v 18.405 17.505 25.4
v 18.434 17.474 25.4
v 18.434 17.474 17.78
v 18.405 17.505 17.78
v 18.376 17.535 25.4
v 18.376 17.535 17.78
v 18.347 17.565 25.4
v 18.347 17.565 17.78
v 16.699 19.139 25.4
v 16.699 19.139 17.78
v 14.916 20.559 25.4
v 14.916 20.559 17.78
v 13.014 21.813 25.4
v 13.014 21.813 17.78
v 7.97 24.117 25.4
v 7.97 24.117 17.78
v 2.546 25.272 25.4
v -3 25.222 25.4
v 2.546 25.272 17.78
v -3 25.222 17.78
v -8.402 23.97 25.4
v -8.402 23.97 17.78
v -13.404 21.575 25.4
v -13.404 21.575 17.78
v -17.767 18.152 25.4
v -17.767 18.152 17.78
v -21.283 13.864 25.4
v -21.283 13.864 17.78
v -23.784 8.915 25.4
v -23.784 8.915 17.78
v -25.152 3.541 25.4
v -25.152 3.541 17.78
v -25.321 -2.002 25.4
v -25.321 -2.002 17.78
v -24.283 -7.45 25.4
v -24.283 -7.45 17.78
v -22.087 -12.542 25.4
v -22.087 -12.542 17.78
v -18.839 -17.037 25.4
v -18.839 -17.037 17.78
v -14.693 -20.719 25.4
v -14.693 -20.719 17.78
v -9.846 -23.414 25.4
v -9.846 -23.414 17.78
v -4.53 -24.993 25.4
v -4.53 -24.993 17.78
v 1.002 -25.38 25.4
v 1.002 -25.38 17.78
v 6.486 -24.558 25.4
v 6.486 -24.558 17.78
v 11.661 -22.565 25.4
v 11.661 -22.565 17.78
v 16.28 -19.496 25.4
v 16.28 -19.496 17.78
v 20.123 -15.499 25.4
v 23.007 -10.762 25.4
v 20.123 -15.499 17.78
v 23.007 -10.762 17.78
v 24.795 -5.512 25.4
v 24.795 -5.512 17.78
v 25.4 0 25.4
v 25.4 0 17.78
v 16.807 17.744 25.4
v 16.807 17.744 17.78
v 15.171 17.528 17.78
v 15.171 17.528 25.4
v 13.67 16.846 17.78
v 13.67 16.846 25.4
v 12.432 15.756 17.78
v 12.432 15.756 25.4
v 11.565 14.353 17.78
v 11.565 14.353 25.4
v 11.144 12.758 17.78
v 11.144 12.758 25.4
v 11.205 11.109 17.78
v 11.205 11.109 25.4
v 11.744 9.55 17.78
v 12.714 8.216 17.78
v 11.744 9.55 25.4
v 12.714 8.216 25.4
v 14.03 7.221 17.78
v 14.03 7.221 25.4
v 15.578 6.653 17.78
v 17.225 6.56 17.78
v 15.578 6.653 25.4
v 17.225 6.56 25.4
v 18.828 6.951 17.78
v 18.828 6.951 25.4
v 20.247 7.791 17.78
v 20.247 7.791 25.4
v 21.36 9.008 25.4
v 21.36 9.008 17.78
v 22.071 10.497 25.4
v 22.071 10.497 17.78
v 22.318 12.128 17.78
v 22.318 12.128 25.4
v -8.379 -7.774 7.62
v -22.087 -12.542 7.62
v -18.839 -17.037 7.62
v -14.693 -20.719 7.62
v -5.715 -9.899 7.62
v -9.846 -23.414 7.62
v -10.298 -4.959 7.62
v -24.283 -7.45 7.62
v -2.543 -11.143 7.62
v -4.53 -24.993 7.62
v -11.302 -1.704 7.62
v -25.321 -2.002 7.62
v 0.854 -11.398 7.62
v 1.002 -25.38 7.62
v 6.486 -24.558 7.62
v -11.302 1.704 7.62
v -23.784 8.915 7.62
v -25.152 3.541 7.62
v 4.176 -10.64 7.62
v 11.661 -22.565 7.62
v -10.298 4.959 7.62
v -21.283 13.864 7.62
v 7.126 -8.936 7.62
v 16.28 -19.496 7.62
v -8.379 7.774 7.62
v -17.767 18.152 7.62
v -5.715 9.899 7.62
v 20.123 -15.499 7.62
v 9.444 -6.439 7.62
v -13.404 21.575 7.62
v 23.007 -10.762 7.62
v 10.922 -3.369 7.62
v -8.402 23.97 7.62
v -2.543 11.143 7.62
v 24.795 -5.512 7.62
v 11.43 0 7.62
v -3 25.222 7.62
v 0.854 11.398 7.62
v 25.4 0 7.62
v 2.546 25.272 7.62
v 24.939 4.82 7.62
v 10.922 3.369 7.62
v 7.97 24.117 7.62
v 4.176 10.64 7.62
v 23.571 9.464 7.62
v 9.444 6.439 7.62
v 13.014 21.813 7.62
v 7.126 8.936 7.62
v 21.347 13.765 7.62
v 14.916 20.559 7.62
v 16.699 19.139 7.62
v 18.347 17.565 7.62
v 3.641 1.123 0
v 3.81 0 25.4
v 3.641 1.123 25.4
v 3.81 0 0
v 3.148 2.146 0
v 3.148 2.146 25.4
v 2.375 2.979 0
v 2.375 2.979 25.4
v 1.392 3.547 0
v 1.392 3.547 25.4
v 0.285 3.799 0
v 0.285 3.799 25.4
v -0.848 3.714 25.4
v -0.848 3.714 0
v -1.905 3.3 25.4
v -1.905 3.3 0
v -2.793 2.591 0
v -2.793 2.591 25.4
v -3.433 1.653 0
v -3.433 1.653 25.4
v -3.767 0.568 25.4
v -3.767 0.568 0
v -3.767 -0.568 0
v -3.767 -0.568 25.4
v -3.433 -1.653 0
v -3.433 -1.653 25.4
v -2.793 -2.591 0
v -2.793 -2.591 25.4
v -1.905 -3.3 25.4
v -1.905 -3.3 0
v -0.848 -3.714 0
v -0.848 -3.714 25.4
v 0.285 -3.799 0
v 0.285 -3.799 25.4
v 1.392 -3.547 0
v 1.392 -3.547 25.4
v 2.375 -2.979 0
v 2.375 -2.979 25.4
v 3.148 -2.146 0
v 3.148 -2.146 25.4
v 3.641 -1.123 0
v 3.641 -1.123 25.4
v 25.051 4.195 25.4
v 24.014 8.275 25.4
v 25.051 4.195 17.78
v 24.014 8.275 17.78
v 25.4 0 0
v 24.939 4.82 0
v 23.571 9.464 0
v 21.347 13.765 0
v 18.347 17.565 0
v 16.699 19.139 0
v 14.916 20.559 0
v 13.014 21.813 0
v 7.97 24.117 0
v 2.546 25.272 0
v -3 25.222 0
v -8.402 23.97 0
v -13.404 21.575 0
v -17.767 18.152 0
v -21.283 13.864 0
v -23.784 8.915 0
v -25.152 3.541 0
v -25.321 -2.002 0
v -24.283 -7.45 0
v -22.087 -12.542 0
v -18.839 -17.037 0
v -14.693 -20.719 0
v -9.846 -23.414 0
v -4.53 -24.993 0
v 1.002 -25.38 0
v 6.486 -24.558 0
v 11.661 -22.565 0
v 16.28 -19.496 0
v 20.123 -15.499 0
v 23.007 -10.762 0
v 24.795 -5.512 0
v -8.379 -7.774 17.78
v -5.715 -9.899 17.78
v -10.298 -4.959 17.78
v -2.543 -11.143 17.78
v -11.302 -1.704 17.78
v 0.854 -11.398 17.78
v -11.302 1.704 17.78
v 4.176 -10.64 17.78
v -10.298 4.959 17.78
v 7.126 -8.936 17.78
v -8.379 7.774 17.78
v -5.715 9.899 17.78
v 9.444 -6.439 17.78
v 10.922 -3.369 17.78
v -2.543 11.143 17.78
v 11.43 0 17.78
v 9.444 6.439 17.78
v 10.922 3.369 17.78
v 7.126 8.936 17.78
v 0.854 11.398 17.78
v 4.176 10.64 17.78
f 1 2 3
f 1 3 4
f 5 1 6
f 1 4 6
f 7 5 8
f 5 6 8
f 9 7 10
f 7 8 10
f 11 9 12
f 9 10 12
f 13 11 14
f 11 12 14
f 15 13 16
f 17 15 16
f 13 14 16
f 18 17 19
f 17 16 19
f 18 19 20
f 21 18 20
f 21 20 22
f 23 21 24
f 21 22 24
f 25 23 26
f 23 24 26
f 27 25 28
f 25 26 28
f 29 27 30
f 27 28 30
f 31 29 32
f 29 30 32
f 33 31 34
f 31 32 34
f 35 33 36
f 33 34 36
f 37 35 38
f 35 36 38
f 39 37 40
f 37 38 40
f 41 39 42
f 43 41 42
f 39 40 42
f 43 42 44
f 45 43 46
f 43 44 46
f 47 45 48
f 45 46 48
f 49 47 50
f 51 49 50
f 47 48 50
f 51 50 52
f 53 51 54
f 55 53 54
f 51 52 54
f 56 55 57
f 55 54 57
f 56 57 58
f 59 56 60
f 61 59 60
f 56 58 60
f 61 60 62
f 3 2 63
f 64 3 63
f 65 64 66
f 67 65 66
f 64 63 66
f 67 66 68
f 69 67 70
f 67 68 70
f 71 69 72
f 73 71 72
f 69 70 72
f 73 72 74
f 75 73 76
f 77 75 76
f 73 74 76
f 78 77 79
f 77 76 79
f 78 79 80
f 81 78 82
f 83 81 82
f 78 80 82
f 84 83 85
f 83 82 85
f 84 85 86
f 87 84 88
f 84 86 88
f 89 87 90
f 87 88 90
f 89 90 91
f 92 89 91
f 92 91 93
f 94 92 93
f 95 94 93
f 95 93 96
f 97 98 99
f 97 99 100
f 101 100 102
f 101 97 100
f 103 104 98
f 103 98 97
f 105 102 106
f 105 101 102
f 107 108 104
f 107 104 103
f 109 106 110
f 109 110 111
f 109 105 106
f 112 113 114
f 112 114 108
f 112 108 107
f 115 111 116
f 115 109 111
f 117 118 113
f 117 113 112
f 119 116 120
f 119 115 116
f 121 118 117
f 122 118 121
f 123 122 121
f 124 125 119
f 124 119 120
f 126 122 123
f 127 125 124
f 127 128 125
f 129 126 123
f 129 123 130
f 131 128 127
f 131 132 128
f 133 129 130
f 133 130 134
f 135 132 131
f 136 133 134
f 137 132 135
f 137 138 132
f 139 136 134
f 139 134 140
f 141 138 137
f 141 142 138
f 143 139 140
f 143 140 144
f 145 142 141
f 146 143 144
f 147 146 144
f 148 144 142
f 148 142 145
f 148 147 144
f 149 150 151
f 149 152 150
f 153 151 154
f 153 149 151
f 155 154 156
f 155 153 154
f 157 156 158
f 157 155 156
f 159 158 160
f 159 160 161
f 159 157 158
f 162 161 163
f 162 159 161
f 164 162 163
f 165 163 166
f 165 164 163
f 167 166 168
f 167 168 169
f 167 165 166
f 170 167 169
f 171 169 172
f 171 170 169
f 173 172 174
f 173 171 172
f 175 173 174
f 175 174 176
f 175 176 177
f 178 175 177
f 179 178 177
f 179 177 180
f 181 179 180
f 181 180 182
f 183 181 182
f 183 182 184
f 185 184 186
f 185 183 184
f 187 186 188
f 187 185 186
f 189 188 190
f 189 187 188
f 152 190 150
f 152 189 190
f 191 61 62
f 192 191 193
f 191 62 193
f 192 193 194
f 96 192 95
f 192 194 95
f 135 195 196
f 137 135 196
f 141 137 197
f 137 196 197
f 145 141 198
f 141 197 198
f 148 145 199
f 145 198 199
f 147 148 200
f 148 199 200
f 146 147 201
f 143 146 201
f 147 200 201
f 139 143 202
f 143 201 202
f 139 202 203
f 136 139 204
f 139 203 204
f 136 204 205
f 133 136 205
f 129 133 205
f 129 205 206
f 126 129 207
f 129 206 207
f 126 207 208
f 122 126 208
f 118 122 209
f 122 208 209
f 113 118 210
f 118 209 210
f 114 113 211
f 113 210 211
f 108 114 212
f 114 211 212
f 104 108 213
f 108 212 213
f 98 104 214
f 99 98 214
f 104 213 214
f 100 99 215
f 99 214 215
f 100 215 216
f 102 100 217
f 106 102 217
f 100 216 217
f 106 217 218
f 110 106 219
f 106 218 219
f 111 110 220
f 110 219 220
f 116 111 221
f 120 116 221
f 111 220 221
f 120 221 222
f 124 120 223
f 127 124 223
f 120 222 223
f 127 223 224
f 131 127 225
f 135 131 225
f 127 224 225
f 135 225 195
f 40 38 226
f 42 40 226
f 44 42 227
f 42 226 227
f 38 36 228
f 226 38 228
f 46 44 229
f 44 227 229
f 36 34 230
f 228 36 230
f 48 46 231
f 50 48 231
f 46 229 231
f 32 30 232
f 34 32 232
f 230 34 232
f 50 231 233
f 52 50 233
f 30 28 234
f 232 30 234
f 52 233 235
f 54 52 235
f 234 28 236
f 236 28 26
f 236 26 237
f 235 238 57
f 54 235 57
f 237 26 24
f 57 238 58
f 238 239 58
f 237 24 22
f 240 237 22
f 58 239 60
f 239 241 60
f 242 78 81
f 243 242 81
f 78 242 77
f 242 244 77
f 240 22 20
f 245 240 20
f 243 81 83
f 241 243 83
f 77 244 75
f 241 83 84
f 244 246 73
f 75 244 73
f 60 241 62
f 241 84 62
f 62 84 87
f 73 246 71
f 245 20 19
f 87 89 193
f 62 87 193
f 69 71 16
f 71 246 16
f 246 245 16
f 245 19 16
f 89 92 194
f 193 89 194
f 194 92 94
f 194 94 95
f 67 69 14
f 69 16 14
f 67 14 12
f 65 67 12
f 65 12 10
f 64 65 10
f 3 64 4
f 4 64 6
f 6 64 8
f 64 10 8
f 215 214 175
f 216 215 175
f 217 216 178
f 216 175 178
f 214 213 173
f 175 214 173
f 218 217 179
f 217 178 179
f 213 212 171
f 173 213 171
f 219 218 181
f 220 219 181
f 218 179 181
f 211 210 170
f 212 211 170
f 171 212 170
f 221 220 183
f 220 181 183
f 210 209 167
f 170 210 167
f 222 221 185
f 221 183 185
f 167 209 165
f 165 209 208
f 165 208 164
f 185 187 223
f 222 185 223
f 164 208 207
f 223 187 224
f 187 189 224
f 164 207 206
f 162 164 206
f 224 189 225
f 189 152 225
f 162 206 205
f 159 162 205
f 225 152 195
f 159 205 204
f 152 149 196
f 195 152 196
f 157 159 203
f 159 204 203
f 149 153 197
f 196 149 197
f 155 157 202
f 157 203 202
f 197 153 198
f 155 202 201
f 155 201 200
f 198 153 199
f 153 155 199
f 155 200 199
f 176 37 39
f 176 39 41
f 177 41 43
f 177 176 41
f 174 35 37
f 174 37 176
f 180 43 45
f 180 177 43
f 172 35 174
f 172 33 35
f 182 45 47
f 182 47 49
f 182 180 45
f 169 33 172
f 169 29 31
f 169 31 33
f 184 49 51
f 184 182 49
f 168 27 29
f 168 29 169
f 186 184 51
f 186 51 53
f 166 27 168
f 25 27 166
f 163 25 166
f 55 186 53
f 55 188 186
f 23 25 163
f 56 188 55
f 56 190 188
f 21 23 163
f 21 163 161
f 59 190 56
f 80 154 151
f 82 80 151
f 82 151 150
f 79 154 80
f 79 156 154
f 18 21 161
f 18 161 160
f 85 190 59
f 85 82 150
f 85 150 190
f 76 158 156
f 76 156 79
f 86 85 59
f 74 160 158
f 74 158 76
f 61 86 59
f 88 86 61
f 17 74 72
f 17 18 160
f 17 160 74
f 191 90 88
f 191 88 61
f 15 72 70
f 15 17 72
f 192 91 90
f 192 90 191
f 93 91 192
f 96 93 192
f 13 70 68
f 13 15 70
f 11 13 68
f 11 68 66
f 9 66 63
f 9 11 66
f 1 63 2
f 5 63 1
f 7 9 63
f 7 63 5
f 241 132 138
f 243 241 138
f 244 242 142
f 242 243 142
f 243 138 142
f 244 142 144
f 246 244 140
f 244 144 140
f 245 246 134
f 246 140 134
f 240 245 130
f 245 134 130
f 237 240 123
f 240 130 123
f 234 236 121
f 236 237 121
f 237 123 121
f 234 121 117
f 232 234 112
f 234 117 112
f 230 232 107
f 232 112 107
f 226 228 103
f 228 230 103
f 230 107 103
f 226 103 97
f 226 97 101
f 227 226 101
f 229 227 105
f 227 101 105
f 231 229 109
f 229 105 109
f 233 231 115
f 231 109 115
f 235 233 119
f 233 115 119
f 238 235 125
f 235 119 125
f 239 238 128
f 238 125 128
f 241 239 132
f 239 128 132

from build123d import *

# Parameters (mm, degrees)
F0_R     = 3.81
F1_DEPTH = 12.7
F2_DEPTH = 12.7
F3_T     = -7.62
F5_DEPTH = 10.16


with BuildPart() as f1:
    # F0 (on Top) → F1 (new body)
    with BuildSketch(Plane.XY):
        with BuildLine():
            ThreePointArc((13.0135805012, 21.8129943506), (-22.0873826509, -12.5422297712), (25.4, 0))
            ThreePointArc((25.4, 0), (23.5709280626, 9.4642141917), (18.3471377744, 17.5653788883))
            ThreePointArc((18.3471377744, 17.5653788883), (7.7542007796, 9.7366332552), (13.0135805012, 21.8129943506))
        make_face()
        Circle(F0_R, mode=Mode.SUBTRACT)
        with BuildLine():
            ThreePointArc((13.0135805012, 21.8129943506), (7.7542007796, 9.7366332552), (18.3471377744, 17.5653788883))
            ThreePointArc((18.3471377744, 17.5653788883), (15.8235338016, 19.8689651978), (13.0135805012, 21.8129943506))
        make_face()
    extrude(amount=F1_DEPTH)

    # F2 (add): a face of the model
    f2_faces = [f1.faces().sort_by_distance(p)[0] for p in [
        (-24.6815795103, 0, 12.7),
    ]]
    extrude(f2_faces, amount=F2_DEPTH)

    # F3
    f3_openings = [f1.faces().sort_by_distance(p)[0] for p in [
        (-25.4, 0, 12.7),
    ]]
    offset(amount=F3_T, openings=f3_openings)

    # F4 (on face) → F5 (cut)
    with BuildSketch(Plane.XY.offset(25.4)):
        with BuildLine():
            ThreePointArc((22.3176650745, 12.1277296154), (20.5505059881, 14.927715955), (18.434145823, 17.4740455469))
            ThreePointArc((18.434145823, 17.4740455469), (12.1795633167, 8.8471330951), (22.3176650745, 12.1277296154))
        make_face()
    extrude(amount=-F5_DEPTH, mode=Mode.SUBTRACT)


solid = f1.part
